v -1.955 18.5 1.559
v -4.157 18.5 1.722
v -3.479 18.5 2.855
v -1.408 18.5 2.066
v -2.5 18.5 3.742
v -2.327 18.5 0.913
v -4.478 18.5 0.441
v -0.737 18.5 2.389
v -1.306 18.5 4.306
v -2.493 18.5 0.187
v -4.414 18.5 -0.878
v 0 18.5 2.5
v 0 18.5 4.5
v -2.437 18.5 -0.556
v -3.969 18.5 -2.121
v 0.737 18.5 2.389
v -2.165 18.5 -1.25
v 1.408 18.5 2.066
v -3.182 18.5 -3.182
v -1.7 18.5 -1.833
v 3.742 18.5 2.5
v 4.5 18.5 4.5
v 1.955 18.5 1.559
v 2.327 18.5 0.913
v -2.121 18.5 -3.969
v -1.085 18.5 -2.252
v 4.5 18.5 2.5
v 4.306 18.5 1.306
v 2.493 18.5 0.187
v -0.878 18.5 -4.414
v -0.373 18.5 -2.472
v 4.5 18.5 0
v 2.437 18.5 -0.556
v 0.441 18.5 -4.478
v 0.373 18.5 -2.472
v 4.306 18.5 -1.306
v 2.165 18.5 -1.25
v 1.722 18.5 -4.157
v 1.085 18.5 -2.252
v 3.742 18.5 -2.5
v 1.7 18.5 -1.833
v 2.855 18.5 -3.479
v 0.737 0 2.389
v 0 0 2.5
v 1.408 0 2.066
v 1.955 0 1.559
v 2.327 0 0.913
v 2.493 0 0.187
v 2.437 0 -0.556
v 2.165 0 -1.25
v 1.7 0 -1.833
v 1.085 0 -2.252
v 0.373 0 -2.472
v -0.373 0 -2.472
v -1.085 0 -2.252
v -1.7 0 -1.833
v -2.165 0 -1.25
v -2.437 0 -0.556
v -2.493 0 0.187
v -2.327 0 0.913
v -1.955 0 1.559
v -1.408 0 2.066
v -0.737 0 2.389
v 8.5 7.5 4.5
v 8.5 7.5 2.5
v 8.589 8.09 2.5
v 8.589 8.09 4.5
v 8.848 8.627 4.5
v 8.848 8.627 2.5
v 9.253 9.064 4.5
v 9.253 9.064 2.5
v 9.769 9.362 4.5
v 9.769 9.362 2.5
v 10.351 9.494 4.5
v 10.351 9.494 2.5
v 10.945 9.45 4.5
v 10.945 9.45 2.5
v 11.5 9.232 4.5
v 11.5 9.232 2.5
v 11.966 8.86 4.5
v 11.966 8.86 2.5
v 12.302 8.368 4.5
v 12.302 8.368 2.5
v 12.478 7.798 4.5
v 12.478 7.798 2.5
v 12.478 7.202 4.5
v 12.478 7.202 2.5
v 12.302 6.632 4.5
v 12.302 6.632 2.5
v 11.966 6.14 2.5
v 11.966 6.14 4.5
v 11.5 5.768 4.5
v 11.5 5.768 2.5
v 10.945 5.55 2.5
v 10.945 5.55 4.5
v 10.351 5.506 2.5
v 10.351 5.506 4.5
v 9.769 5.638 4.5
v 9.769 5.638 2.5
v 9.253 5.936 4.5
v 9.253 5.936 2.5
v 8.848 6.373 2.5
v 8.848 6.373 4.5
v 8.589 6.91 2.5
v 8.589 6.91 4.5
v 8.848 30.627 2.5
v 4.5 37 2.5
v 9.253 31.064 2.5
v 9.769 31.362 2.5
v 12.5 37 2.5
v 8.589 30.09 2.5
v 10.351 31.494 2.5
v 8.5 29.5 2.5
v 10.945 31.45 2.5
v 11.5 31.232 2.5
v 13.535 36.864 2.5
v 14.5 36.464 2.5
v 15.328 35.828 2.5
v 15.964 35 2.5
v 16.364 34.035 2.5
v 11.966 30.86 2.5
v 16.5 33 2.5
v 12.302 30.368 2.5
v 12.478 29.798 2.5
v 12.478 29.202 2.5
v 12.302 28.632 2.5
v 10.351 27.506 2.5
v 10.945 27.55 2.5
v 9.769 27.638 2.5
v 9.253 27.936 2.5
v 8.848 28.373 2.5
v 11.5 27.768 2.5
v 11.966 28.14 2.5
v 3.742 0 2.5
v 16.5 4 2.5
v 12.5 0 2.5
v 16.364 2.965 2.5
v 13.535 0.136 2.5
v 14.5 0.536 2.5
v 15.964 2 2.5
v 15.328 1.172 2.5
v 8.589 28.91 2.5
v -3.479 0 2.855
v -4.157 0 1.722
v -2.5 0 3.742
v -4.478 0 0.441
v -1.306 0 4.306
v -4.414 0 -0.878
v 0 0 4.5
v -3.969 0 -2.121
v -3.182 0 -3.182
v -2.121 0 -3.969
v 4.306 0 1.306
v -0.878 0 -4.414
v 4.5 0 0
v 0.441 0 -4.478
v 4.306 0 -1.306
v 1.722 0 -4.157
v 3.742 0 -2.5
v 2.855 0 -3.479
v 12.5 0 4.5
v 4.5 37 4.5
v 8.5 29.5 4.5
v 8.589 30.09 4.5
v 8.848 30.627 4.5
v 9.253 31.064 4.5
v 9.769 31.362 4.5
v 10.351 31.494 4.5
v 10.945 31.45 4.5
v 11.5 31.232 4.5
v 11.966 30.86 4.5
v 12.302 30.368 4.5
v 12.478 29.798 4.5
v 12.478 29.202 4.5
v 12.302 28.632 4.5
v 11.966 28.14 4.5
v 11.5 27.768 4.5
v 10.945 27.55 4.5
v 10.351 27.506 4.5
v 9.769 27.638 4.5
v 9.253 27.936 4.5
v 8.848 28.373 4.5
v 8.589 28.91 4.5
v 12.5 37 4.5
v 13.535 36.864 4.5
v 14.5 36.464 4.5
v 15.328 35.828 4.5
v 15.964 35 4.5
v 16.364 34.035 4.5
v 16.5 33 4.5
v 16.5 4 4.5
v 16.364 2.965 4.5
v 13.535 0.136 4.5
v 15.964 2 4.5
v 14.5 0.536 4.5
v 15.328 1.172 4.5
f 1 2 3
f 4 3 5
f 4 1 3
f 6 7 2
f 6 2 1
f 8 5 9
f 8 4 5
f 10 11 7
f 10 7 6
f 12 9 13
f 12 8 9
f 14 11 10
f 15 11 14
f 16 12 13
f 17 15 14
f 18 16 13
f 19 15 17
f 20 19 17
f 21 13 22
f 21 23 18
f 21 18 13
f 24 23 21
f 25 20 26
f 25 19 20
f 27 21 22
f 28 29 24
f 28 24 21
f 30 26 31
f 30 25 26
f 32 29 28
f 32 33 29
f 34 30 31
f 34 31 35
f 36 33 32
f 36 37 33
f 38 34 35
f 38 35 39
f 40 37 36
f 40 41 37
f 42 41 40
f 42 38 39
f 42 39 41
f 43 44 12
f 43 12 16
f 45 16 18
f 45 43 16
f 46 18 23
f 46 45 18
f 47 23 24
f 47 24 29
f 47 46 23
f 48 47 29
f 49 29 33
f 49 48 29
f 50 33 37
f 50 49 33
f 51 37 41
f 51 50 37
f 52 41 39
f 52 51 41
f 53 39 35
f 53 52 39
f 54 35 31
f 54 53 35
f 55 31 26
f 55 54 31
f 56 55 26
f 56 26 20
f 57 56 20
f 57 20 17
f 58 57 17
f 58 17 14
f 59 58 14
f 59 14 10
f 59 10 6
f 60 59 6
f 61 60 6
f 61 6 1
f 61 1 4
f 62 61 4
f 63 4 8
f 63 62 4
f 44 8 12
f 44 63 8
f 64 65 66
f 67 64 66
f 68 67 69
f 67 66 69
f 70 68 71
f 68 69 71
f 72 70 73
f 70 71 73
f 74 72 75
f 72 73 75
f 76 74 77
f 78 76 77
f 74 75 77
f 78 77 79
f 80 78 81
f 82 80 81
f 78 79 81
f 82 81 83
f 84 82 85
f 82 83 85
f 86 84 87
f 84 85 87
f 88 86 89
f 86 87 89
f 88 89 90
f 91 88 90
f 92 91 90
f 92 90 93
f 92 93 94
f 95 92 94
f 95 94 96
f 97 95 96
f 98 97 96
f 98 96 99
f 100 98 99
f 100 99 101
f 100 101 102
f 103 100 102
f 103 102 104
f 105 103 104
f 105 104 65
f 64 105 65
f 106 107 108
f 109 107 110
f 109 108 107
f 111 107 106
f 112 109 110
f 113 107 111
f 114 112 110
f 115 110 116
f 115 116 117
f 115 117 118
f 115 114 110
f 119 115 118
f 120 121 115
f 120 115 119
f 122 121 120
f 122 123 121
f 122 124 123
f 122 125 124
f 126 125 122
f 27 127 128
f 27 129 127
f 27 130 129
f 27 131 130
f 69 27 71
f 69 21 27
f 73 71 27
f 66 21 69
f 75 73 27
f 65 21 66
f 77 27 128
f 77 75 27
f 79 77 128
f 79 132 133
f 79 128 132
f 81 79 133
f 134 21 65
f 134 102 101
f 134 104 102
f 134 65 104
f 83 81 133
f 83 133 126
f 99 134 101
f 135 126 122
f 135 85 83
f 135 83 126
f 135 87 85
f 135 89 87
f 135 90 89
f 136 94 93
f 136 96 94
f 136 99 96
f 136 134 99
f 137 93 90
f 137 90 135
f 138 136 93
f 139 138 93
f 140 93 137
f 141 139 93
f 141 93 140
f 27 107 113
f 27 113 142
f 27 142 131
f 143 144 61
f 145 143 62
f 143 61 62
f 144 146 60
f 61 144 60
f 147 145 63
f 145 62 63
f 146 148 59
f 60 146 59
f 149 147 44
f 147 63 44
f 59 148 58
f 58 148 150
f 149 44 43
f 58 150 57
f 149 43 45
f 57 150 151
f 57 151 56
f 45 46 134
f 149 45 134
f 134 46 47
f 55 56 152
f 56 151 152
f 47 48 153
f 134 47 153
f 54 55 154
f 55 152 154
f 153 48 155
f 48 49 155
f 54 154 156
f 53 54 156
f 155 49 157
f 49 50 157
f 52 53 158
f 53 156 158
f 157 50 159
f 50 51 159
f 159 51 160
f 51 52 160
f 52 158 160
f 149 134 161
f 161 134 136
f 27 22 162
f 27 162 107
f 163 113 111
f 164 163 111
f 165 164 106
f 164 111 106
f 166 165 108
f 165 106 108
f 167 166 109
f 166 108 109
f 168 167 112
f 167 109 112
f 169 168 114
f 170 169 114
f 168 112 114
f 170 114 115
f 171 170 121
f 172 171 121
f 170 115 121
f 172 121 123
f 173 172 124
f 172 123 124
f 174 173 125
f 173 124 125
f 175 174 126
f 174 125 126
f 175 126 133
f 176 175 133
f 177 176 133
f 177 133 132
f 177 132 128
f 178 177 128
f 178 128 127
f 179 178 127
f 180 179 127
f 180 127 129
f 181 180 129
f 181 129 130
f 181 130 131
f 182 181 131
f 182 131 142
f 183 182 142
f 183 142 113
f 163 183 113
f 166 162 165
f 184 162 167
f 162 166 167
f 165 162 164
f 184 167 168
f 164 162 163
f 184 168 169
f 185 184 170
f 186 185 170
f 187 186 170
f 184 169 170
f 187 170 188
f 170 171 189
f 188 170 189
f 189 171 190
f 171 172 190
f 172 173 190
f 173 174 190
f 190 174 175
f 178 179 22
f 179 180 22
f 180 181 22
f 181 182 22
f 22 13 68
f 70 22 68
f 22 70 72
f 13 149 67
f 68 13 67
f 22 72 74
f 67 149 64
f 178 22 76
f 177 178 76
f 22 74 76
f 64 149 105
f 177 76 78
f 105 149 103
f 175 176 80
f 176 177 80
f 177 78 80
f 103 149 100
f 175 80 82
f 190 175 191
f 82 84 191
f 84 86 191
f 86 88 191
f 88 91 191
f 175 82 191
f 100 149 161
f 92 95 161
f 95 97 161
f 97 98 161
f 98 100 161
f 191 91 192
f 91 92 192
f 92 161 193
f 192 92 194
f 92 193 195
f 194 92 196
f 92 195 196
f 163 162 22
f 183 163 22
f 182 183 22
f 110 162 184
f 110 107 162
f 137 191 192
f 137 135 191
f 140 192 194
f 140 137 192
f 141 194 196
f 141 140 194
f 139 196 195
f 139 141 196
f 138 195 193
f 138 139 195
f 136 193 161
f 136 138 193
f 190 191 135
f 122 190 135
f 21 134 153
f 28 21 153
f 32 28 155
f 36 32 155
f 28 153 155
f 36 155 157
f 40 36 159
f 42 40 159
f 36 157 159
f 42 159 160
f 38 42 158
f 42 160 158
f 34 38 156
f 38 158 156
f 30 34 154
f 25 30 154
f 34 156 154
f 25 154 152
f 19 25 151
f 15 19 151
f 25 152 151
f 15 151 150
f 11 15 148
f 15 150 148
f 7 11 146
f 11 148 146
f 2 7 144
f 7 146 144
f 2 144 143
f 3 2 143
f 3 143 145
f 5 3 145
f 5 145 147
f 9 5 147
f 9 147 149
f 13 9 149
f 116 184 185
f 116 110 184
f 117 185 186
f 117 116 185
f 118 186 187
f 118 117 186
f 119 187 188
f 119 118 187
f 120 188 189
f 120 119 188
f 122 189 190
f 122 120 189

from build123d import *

# Parameters (mm, degrees)
SKETCH_1_R          = 2.5
EXTRUDE_1_DEPTH     = 18.5
SKETCH_2_W          = 12
SKETCH_2_H          = 2
EXTRUDE_2_DEPTH     = 18.5
CUT_EXTRUDE_1_REACH = 43.113
SKETCH_3_R          = 2
FILLET_1_R          = 4


with BuildPart() as part:
    # 草图1 → 凸台-拉伸1 (new body)
    with BuildSketch(Plane(origin=(0, 0, 0), x_dir=(1, 0, 0), z_dir=(0, 1, 0))):
        with BuildLine():
            Line((0, -4.5), (16.5, -4.5))
            Line((16.5, -4.5), (16.5, -2.5))
            Line((16.5, -2.5), (3.741657387, -2.5))
            ThreePointArc((3.741657387, -2.5), (-2.121320344, 3.968626967), (0, -4.5))
        make_face()
        with Locations(Location((0, 0, 0), (0, 0, 270))):
            Circle(SKETCH_1_R, mode=Mode.SUBTRACT)
    extrude(amount=EXTRUDE_1_DEPTH)

    # 草图2 → 凸台-拉伸2 (add)
    with BuildSketch(Plane(origin=(0, 18.5, 0), x_dir=(1, 0, 0), z_dir=(0, 1, 0))):
        with Locations((10.5, -3.5)):
            Rectangle(SKETCH_2_W, SKETCH_2_H)
    extrude(amount=EXTRUDE_2_DEPTH)

    # 草图3 → 切除-拉伸1 (cut, up to next)
    with BuildSketch(Plane(origin=(0, 0, 2.5), x_dir=(-1, 0, 0), z_dir=(0, 0, -1)), mode=Mode.PRIVATE) as cut_extrude_1_sk1:
        with Locations((-10.5, 7.5)):
            Circle(SKETCH_3_R)
    cut_extrude_1_tool1 = extrude(cut_extrude_1_sk1.sketch, amount=-CUT_EXTRUDE_1_REACH, mode=Mode.PRIVATE) & part.part
    # 草图3 → 切除-拉伸1 (cut, up to next)
    with BuildSketch(Plane(origin=(0, 0, 2.5), x_dir=(-1, 0, 0), z_dir=(0, 0, -1)), mode=Mode.PRIVATE) as cut_extrude_1_sk2:
        with Locations((-10.5, 29.5)):
            Circle(SKETCH_3_R)
    cut_extrude_1_tool2 = extrude(cut_extrude_1_sk2.sketch, amount=-CUT_EXTRUDE_1_REACH, mode=Mode.PRIVATE) & part.part
    add(cut_extrude_1_tool1.solids().sort_by_distance((10.5, 7.5, 2.5))[0], mode=Mode.SUBTRACT)
    add(cut_extrude_1_tool2.solids().sort_by_distance((10.5, 29.5, 2.5))[0], mode=Mode.SUBTRACT)

    # 圆角1
    fillet_1_edges = [part.edges().sort_by_distance(p)[0] for p in [
        (16.5, 37, 3.5),
        (16.5, 0, 3.5),
    ]]
    fillet(fillet_1_edges, radius=FILLET_1_R)


solid = part.part
